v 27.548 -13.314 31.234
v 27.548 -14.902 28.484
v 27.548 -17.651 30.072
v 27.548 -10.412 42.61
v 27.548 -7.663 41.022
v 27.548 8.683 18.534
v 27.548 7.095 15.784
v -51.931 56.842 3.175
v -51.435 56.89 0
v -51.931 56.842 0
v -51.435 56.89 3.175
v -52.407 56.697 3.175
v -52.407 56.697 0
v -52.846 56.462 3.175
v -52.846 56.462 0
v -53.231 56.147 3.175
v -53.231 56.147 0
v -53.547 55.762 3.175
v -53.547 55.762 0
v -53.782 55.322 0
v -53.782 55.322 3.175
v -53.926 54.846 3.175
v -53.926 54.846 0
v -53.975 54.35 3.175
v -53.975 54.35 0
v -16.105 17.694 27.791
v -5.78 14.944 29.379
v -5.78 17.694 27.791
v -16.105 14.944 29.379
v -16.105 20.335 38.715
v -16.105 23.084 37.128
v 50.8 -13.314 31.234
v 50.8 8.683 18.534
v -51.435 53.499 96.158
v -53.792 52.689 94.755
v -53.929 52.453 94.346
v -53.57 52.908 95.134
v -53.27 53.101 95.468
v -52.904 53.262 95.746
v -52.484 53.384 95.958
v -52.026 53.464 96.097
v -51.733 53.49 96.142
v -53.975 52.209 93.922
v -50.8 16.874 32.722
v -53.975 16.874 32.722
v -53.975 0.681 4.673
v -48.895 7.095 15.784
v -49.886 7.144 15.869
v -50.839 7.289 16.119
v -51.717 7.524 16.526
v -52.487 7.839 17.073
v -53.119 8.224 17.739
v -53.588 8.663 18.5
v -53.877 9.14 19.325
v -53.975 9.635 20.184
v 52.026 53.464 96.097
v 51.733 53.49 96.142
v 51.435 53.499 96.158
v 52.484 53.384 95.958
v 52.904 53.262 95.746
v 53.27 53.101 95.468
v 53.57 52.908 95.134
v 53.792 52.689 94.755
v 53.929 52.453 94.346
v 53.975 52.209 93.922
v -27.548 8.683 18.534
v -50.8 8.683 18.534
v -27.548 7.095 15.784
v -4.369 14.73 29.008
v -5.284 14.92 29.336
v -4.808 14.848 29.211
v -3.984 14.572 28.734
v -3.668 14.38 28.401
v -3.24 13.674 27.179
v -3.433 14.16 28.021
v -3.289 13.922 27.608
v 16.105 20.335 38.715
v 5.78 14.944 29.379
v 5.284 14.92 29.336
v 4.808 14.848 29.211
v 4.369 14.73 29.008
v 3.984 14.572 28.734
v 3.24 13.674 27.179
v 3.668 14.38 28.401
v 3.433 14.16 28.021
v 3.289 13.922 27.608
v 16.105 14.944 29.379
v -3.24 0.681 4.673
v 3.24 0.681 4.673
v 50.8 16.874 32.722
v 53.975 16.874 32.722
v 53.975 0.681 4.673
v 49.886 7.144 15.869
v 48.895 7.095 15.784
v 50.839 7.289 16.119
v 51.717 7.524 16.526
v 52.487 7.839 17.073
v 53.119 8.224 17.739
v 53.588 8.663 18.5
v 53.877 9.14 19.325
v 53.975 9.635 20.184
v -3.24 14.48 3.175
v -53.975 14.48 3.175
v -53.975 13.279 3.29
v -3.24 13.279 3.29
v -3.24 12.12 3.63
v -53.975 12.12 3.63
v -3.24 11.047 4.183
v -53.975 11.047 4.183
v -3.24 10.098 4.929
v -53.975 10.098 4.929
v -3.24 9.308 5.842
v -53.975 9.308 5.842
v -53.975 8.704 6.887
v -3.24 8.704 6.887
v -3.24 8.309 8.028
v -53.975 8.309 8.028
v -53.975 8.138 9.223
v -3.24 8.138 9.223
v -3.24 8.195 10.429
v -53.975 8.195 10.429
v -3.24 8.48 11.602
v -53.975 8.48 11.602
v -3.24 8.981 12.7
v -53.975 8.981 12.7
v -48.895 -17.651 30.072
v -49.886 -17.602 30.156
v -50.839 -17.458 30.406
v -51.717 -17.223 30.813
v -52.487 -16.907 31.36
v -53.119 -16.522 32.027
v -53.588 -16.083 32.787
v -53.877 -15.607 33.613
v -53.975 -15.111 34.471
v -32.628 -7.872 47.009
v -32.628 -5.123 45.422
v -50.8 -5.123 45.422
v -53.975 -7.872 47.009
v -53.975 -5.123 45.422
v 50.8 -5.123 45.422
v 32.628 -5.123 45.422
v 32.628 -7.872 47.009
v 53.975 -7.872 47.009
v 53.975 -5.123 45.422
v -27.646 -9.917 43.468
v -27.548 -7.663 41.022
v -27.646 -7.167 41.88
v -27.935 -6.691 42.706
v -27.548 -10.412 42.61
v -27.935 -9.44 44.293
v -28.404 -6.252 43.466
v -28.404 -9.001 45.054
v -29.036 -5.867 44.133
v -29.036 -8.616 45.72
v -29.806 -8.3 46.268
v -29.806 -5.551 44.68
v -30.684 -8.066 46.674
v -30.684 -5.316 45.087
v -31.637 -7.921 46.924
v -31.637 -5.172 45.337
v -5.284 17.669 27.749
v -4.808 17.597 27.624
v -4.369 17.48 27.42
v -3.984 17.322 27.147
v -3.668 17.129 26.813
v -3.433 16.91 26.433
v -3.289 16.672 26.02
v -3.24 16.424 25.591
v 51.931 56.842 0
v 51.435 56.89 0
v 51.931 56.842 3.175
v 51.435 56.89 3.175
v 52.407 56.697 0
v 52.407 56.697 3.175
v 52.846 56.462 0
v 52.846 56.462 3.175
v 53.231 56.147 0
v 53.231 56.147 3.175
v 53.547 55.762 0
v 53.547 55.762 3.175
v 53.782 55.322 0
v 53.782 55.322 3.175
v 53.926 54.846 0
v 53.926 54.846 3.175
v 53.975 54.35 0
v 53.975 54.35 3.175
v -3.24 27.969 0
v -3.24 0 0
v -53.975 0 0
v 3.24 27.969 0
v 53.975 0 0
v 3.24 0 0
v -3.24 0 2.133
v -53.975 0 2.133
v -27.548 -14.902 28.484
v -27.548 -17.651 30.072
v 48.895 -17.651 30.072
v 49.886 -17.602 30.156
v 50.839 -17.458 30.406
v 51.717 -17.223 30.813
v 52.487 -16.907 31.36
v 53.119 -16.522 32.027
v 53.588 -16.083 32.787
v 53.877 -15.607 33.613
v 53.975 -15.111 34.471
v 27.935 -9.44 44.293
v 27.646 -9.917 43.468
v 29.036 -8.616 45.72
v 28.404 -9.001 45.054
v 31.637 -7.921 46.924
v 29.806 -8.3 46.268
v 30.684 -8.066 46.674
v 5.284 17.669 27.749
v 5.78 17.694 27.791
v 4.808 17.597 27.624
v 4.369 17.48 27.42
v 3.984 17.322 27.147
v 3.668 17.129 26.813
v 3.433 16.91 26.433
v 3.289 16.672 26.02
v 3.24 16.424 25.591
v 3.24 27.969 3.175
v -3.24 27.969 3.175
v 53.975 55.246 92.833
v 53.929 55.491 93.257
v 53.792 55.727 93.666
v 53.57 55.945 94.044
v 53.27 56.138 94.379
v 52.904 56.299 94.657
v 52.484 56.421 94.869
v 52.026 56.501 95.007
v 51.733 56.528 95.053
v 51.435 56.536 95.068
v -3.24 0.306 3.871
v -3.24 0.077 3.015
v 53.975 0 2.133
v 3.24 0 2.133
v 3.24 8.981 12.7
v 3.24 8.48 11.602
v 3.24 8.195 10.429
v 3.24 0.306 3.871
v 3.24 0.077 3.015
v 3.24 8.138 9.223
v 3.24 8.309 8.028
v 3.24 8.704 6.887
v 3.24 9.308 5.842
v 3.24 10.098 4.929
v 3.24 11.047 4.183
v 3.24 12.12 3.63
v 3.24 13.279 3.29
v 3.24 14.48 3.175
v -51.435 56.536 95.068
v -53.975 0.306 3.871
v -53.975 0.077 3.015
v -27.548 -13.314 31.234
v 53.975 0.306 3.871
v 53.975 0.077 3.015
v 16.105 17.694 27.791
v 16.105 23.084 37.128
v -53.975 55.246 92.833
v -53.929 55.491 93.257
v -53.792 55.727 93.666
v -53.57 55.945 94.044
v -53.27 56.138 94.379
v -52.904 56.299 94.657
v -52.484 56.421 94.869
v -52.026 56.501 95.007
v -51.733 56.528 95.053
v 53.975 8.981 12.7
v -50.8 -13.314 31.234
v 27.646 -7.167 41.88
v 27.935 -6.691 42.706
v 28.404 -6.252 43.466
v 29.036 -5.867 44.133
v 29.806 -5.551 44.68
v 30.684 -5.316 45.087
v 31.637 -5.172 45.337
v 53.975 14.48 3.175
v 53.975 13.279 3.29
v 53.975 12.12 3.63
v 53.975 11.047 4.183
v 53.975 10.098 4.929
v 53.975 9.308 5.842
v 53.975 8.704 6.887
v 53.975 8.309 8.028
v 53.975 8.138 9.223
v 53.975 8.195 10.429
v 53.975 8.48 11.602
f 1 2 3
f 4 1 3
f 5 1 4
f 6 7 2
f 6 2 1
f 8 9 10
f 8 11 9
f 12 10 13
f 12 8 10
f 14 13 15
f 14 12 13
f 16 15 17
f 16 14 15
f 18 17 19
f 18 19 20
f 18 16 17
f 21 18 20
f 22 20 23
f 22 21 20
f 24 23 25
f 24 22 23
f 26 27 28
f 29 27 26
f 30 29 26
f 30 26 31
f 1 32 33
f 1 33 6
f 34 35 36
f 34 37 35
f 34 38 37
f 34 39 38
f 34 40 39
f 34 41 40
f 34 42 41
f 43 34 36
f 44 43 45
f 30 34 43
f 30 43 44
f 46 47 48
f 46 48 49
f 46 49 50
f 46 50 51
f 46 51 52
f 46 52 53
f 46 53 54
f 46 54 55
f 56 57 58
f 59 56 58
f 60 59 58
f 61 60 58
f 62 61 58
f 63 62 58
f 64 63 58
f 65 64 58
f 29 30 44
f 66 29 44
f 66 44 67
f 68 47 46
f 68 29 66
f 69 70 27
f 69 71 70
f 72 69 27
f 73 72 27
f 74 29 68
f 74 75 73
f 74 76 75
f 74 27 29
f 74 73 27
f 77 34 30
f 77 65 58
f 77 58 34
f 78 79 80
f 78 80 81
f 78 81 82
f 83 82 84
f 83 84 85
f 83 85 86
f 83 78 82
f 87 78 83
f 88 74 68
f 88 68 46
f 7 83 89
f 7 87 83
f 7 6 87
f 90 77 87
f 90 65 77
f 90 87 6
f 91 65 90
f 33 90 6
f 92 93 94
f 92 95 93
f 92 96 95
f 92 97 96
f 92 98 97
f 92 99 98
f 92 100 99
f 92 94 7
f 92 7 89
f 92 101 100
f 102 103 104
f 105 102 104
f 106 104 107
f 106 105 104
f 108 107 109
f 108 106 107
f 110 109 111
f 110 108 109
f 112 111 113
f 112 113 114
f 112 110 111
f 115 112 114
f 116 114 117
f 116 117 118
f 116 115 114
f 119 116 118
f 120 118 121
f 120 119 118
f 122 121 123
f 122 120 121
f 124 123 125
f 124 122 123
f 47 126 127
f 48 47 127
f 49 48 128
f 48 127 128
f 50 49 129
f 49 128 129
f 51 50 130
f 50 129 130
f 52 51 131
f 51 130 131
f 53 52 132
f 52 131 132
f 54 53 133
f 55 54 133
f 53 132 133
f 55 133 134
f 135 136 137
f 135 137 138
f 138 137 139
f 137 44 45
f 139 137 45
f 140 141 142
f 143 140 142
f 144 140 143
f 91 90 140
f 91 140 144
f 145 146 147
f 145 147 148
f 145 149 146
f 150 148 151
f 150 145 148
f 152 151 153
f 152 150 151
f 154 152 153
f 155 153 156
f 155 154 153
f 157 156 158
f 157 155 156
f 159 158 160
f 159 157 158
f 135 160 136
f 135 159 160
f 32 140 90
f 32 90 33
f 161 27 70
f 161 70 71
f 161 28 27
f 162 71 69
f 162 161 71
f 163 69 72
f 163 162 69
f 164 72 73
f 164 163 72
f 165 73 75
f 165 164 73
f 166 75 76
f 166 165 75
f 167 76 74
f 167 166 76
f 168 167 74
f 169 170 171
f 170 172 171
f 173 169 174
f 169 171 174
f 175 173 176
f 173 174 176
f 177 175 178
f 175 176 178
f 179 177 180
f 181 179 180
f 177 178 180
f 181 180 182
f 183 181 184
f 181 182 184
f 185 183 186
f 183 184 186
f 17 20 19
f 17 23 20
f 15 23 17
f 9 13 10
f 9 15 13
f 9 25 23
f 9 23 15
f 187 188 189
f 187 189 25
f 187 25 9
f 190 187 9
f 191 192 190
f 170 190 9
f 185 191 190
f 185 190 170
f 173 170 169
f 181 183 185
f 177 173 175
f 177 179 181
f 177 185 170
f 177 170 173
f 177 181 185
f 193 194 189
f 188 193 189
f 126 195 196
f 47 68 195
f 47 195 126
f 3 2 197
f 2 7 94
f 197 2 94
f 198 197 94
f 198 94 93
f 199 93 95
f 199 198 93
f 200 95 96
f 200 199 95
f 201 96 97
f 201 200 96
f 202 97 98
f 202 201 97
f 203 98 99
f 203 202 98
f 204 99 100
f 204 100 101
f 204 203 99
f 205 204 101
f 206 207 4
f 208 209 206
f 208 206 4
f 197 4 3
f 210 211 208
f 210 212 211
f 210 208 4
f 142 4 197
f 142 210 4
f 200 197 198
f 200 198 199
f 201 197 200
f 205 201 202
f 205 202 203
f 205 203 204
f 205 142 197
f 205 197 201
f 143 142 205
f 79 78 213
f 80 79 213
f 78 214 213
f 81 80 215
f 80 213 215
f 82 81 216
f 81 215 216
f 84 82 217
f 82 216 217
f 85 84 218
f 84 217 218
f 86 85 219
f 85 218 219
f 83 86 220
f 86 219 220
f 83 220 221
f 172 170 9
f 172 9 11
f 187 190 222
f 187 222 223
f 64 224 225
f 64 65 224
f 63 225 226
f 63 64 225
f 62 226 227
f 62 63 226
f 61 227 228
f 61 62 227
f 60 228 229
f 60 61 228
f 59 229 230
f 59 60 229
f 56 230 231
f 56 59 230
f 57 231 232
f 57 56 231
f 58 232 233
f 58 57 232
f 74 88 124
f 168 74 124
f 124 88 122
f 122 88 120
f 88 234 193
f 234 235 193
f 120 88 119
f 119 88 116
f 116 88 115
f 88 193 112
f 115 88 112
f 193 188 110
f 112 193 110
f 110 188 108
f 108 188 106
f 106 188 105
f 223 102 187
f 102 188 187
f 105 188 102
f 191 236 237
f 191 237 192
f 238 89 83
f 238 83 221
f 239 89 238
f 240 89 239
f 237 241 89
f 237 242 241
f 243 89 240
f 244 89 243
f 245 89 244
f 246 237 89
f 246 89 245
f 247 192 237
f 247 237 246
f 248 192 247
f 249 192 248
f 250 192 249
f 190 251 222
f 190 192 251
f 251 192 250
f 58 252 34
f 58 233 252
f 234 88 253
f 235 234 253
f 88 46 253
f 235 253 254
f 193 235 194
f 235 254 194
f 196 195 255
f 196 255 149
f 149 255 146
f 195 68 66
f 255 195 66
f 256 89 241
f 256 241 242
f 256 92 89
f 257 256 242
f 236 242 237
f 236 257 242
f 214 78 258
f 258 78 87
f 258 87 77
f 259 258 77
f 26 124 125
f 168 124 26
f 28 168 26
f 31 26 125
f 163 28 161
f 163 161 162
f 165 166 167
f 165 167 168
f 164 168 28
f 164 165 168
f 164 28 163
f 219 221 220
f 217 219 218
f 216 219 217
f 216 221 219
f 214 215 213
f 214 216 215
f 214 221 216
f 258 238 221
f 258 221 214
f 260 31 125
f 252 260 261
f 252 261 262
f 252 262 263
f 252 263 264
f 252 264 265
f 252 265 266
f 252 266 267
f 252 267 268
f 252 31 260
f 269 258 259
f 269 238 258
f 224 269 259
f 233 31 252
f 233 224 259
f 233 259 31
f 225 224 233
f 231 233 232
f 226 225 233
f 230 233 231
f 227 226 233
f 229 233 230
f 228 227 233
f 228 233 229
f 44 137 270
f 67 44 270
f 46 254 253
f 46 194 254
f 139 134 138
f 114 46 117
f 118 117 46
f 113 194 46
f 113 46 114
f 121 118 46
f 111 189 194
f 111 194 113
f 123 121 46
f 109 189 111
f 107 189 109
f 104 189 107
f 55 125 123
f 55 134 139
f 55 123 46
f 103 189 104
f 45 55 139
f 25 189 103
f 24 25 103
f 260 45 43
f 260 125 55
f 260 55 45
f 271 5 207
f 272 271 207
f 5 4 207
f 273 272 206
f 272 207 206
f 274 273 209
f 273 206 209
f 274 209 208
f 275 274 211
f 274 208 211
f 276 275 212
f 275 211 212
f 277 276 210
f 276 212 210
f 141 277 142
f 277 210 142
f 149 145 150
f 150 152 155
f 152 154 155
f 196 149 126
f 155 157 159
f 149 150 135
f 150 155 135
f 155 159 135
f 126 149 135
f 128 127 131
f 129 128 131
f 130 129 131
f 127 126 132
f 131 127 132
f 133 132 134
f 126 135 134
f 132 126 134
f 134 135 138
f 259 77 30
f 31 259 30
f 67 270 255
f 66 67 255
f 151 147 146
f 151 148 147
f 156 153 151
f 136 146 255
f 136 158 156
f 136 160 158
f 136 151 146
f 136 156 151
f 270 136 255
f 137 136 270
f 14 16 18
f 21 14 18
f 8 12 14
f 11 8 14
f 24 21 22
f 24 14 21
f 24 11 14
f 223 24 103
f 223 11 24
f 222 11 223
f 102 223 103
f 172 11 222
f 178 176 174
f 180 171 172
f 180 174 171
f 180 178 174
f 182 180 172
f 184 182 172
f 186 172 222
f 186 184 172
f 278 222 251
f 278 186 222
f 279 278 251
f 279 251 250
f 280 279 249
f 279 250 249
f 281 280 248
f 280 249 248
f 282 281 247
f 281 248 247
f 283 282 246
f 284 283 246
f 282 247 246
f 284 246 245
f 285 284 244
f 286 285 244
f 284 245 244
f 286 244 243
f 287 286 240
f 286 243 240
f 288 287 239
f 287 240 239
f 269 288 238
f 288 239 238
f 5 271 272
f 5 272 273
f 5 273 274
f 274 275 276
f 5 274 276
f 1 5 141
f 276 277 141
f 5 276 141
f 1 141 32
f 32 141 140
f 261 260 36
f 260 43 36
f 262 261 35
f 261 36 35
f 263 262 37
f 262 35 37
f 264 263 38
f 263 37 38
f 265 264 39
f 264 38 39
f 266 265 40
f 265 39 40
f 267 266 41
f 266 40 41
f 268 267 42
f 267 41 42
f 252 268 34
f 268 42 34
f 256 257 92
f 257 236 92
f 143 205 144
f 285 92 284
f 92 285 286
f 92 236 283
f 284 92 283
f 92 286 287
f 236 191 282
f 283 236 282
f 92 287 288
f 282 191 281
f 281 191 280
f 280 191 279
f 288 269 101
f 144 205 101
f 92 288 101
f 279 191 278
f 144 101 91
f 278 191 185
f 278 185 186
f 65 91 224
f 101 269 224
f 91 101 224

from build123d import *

# Parameters (mm, degrees)
F1_DEPTH = 53.975
F3_DEPTH = 25.4
F4_W     = 16.1045007408
F4_H     = 10.7811614871
F5_DEPTH = 3.175
F6_W     = 3.2399867196
F6_H     = 27.9691088945
F7_REACH = 124.3150351858
F8_W     = 26.4270068914
F8_H     = 19.5576284379
F9_DEPTH = 3.175
F10_R    = 5.08
F11_R    = 2.54


with BuildPart() as f1:
    # F0 (on Right) → F1 (new body)
    with BuildSketch(Plane.YZ):
        with BuildLine():
            Line((0, 0), (56.8904802203, 0))
            Line((56.8904802203, 0), (56.8904802203, 3.175))
            Line((56.8904802203, 3.175), (14.4803198381, 3.175))
            ThreePointArc((14.4803198381, 3.175), (8.981058524, 6.35), (8.981058524, 12.7))
            Line((8.981058524, 12.7), (56.5364878665, 95.0684197969))
            Line((56.5364878665, 95.0684197969), (53.4993190127, 96.1578890309))
            Line((53.4993190127, 96.1578890309), (0, 3.4943503306))
            Line((0, 3.4943503306), (0, 0))
        make_face()
    extrude(amount=F1_DEPTH)

    # F2 (on face) → F3 (join)
    with BuildSketch(Plane(origin=(0, -1.513098078, 0.8735875827), x_dir=(1, 0, 0), z_dir=(0, -0.8660254038, 0.5))):
        Polygon((27.5479931086, 17.2171894163), (53.975, 17.2171894163), (53.975, 36.7748178542), (50.8, 36.7748178542), (50.8, 20.3921894163), (27.5479931086, 20.3921894163), align=None)
    extrude(amount=F3_DEPTH)

    # F4 (on face) → F5 (cut, through all)
    with BuildSketch(Plane(origin=(0, -1.513098078, 0.8735875827), x_dir=(1, 0, 0), z_dir=(0, -0.8660254038, 0.5))):
        with Locations((8.0522503704, 38.3052378893)):
            Rectangle(F4_W, F4_H)
    extrude(amount=-F5_DEPTH, mode=Mode.SUBTRACT)

    f7_end = Plane(origin=(8.0522503704, 16.3190458234, 28.5847668277), x_dir=(0, 0.8660254038, -0.5), z_dir=(0, 0.5, 0.8660254038))
    # F6 (on Top) → F7 (cut, up to a plane its end follows)
    with BuildSketch(Plane.XY):
        with Locations((1.6199933598, 13.9845544472)):
            Rectangle(F6_W, F6_H)
    f7_long = extrude(amount=F7_REACH, mode=Mode.PRIVATE)
    add(split(f7_long, bisect_by=f7_end, keep=Keep.BOTTOM, mode=Mode.PRIVATE), mode=Mode.SUBTRACT)

    # F8 (on face) → F9 (join)
    with BuildSketch(Plane(origin=(0, -23.5101433341, 13.5735875827), x_dir=(1, 0, 0), z_dir=(0, -0.8660254038, 0.5))):
        with Locations((40.7614965543, 26.9960036352)):
            Rectangle(F8_W, F8_H)
    extrude(amount=F9_DEPTH)

    # F10
    f10_edges = [f1.edges().sort_by_distance(p)[0] for p in [
        (28.607493, 0, 3.49435),
        (53.975, -5.277841, 22.927861),
        (27.547993, -6.49755, 46.215264),
    ]]
    fillet(f10_edges, radius=F10_R)

    # F11
    f11_edges = [f1.edges().sort_by_distance(p)[0] for p in [
        (53.975, 55.017903, 95.613154),
        (53.975, 56.89048, 1.5875),
        (3.239987, 16.319046, 28.584767),
    ]]
    fillet(f11_edges, radius=F11_R)

    # F12: F1 across plane


with BuildPart() as f1_1:
    add(f1.part)
    add(f1.part.mirror(Plane.YZ))


solid = f1_1.part
